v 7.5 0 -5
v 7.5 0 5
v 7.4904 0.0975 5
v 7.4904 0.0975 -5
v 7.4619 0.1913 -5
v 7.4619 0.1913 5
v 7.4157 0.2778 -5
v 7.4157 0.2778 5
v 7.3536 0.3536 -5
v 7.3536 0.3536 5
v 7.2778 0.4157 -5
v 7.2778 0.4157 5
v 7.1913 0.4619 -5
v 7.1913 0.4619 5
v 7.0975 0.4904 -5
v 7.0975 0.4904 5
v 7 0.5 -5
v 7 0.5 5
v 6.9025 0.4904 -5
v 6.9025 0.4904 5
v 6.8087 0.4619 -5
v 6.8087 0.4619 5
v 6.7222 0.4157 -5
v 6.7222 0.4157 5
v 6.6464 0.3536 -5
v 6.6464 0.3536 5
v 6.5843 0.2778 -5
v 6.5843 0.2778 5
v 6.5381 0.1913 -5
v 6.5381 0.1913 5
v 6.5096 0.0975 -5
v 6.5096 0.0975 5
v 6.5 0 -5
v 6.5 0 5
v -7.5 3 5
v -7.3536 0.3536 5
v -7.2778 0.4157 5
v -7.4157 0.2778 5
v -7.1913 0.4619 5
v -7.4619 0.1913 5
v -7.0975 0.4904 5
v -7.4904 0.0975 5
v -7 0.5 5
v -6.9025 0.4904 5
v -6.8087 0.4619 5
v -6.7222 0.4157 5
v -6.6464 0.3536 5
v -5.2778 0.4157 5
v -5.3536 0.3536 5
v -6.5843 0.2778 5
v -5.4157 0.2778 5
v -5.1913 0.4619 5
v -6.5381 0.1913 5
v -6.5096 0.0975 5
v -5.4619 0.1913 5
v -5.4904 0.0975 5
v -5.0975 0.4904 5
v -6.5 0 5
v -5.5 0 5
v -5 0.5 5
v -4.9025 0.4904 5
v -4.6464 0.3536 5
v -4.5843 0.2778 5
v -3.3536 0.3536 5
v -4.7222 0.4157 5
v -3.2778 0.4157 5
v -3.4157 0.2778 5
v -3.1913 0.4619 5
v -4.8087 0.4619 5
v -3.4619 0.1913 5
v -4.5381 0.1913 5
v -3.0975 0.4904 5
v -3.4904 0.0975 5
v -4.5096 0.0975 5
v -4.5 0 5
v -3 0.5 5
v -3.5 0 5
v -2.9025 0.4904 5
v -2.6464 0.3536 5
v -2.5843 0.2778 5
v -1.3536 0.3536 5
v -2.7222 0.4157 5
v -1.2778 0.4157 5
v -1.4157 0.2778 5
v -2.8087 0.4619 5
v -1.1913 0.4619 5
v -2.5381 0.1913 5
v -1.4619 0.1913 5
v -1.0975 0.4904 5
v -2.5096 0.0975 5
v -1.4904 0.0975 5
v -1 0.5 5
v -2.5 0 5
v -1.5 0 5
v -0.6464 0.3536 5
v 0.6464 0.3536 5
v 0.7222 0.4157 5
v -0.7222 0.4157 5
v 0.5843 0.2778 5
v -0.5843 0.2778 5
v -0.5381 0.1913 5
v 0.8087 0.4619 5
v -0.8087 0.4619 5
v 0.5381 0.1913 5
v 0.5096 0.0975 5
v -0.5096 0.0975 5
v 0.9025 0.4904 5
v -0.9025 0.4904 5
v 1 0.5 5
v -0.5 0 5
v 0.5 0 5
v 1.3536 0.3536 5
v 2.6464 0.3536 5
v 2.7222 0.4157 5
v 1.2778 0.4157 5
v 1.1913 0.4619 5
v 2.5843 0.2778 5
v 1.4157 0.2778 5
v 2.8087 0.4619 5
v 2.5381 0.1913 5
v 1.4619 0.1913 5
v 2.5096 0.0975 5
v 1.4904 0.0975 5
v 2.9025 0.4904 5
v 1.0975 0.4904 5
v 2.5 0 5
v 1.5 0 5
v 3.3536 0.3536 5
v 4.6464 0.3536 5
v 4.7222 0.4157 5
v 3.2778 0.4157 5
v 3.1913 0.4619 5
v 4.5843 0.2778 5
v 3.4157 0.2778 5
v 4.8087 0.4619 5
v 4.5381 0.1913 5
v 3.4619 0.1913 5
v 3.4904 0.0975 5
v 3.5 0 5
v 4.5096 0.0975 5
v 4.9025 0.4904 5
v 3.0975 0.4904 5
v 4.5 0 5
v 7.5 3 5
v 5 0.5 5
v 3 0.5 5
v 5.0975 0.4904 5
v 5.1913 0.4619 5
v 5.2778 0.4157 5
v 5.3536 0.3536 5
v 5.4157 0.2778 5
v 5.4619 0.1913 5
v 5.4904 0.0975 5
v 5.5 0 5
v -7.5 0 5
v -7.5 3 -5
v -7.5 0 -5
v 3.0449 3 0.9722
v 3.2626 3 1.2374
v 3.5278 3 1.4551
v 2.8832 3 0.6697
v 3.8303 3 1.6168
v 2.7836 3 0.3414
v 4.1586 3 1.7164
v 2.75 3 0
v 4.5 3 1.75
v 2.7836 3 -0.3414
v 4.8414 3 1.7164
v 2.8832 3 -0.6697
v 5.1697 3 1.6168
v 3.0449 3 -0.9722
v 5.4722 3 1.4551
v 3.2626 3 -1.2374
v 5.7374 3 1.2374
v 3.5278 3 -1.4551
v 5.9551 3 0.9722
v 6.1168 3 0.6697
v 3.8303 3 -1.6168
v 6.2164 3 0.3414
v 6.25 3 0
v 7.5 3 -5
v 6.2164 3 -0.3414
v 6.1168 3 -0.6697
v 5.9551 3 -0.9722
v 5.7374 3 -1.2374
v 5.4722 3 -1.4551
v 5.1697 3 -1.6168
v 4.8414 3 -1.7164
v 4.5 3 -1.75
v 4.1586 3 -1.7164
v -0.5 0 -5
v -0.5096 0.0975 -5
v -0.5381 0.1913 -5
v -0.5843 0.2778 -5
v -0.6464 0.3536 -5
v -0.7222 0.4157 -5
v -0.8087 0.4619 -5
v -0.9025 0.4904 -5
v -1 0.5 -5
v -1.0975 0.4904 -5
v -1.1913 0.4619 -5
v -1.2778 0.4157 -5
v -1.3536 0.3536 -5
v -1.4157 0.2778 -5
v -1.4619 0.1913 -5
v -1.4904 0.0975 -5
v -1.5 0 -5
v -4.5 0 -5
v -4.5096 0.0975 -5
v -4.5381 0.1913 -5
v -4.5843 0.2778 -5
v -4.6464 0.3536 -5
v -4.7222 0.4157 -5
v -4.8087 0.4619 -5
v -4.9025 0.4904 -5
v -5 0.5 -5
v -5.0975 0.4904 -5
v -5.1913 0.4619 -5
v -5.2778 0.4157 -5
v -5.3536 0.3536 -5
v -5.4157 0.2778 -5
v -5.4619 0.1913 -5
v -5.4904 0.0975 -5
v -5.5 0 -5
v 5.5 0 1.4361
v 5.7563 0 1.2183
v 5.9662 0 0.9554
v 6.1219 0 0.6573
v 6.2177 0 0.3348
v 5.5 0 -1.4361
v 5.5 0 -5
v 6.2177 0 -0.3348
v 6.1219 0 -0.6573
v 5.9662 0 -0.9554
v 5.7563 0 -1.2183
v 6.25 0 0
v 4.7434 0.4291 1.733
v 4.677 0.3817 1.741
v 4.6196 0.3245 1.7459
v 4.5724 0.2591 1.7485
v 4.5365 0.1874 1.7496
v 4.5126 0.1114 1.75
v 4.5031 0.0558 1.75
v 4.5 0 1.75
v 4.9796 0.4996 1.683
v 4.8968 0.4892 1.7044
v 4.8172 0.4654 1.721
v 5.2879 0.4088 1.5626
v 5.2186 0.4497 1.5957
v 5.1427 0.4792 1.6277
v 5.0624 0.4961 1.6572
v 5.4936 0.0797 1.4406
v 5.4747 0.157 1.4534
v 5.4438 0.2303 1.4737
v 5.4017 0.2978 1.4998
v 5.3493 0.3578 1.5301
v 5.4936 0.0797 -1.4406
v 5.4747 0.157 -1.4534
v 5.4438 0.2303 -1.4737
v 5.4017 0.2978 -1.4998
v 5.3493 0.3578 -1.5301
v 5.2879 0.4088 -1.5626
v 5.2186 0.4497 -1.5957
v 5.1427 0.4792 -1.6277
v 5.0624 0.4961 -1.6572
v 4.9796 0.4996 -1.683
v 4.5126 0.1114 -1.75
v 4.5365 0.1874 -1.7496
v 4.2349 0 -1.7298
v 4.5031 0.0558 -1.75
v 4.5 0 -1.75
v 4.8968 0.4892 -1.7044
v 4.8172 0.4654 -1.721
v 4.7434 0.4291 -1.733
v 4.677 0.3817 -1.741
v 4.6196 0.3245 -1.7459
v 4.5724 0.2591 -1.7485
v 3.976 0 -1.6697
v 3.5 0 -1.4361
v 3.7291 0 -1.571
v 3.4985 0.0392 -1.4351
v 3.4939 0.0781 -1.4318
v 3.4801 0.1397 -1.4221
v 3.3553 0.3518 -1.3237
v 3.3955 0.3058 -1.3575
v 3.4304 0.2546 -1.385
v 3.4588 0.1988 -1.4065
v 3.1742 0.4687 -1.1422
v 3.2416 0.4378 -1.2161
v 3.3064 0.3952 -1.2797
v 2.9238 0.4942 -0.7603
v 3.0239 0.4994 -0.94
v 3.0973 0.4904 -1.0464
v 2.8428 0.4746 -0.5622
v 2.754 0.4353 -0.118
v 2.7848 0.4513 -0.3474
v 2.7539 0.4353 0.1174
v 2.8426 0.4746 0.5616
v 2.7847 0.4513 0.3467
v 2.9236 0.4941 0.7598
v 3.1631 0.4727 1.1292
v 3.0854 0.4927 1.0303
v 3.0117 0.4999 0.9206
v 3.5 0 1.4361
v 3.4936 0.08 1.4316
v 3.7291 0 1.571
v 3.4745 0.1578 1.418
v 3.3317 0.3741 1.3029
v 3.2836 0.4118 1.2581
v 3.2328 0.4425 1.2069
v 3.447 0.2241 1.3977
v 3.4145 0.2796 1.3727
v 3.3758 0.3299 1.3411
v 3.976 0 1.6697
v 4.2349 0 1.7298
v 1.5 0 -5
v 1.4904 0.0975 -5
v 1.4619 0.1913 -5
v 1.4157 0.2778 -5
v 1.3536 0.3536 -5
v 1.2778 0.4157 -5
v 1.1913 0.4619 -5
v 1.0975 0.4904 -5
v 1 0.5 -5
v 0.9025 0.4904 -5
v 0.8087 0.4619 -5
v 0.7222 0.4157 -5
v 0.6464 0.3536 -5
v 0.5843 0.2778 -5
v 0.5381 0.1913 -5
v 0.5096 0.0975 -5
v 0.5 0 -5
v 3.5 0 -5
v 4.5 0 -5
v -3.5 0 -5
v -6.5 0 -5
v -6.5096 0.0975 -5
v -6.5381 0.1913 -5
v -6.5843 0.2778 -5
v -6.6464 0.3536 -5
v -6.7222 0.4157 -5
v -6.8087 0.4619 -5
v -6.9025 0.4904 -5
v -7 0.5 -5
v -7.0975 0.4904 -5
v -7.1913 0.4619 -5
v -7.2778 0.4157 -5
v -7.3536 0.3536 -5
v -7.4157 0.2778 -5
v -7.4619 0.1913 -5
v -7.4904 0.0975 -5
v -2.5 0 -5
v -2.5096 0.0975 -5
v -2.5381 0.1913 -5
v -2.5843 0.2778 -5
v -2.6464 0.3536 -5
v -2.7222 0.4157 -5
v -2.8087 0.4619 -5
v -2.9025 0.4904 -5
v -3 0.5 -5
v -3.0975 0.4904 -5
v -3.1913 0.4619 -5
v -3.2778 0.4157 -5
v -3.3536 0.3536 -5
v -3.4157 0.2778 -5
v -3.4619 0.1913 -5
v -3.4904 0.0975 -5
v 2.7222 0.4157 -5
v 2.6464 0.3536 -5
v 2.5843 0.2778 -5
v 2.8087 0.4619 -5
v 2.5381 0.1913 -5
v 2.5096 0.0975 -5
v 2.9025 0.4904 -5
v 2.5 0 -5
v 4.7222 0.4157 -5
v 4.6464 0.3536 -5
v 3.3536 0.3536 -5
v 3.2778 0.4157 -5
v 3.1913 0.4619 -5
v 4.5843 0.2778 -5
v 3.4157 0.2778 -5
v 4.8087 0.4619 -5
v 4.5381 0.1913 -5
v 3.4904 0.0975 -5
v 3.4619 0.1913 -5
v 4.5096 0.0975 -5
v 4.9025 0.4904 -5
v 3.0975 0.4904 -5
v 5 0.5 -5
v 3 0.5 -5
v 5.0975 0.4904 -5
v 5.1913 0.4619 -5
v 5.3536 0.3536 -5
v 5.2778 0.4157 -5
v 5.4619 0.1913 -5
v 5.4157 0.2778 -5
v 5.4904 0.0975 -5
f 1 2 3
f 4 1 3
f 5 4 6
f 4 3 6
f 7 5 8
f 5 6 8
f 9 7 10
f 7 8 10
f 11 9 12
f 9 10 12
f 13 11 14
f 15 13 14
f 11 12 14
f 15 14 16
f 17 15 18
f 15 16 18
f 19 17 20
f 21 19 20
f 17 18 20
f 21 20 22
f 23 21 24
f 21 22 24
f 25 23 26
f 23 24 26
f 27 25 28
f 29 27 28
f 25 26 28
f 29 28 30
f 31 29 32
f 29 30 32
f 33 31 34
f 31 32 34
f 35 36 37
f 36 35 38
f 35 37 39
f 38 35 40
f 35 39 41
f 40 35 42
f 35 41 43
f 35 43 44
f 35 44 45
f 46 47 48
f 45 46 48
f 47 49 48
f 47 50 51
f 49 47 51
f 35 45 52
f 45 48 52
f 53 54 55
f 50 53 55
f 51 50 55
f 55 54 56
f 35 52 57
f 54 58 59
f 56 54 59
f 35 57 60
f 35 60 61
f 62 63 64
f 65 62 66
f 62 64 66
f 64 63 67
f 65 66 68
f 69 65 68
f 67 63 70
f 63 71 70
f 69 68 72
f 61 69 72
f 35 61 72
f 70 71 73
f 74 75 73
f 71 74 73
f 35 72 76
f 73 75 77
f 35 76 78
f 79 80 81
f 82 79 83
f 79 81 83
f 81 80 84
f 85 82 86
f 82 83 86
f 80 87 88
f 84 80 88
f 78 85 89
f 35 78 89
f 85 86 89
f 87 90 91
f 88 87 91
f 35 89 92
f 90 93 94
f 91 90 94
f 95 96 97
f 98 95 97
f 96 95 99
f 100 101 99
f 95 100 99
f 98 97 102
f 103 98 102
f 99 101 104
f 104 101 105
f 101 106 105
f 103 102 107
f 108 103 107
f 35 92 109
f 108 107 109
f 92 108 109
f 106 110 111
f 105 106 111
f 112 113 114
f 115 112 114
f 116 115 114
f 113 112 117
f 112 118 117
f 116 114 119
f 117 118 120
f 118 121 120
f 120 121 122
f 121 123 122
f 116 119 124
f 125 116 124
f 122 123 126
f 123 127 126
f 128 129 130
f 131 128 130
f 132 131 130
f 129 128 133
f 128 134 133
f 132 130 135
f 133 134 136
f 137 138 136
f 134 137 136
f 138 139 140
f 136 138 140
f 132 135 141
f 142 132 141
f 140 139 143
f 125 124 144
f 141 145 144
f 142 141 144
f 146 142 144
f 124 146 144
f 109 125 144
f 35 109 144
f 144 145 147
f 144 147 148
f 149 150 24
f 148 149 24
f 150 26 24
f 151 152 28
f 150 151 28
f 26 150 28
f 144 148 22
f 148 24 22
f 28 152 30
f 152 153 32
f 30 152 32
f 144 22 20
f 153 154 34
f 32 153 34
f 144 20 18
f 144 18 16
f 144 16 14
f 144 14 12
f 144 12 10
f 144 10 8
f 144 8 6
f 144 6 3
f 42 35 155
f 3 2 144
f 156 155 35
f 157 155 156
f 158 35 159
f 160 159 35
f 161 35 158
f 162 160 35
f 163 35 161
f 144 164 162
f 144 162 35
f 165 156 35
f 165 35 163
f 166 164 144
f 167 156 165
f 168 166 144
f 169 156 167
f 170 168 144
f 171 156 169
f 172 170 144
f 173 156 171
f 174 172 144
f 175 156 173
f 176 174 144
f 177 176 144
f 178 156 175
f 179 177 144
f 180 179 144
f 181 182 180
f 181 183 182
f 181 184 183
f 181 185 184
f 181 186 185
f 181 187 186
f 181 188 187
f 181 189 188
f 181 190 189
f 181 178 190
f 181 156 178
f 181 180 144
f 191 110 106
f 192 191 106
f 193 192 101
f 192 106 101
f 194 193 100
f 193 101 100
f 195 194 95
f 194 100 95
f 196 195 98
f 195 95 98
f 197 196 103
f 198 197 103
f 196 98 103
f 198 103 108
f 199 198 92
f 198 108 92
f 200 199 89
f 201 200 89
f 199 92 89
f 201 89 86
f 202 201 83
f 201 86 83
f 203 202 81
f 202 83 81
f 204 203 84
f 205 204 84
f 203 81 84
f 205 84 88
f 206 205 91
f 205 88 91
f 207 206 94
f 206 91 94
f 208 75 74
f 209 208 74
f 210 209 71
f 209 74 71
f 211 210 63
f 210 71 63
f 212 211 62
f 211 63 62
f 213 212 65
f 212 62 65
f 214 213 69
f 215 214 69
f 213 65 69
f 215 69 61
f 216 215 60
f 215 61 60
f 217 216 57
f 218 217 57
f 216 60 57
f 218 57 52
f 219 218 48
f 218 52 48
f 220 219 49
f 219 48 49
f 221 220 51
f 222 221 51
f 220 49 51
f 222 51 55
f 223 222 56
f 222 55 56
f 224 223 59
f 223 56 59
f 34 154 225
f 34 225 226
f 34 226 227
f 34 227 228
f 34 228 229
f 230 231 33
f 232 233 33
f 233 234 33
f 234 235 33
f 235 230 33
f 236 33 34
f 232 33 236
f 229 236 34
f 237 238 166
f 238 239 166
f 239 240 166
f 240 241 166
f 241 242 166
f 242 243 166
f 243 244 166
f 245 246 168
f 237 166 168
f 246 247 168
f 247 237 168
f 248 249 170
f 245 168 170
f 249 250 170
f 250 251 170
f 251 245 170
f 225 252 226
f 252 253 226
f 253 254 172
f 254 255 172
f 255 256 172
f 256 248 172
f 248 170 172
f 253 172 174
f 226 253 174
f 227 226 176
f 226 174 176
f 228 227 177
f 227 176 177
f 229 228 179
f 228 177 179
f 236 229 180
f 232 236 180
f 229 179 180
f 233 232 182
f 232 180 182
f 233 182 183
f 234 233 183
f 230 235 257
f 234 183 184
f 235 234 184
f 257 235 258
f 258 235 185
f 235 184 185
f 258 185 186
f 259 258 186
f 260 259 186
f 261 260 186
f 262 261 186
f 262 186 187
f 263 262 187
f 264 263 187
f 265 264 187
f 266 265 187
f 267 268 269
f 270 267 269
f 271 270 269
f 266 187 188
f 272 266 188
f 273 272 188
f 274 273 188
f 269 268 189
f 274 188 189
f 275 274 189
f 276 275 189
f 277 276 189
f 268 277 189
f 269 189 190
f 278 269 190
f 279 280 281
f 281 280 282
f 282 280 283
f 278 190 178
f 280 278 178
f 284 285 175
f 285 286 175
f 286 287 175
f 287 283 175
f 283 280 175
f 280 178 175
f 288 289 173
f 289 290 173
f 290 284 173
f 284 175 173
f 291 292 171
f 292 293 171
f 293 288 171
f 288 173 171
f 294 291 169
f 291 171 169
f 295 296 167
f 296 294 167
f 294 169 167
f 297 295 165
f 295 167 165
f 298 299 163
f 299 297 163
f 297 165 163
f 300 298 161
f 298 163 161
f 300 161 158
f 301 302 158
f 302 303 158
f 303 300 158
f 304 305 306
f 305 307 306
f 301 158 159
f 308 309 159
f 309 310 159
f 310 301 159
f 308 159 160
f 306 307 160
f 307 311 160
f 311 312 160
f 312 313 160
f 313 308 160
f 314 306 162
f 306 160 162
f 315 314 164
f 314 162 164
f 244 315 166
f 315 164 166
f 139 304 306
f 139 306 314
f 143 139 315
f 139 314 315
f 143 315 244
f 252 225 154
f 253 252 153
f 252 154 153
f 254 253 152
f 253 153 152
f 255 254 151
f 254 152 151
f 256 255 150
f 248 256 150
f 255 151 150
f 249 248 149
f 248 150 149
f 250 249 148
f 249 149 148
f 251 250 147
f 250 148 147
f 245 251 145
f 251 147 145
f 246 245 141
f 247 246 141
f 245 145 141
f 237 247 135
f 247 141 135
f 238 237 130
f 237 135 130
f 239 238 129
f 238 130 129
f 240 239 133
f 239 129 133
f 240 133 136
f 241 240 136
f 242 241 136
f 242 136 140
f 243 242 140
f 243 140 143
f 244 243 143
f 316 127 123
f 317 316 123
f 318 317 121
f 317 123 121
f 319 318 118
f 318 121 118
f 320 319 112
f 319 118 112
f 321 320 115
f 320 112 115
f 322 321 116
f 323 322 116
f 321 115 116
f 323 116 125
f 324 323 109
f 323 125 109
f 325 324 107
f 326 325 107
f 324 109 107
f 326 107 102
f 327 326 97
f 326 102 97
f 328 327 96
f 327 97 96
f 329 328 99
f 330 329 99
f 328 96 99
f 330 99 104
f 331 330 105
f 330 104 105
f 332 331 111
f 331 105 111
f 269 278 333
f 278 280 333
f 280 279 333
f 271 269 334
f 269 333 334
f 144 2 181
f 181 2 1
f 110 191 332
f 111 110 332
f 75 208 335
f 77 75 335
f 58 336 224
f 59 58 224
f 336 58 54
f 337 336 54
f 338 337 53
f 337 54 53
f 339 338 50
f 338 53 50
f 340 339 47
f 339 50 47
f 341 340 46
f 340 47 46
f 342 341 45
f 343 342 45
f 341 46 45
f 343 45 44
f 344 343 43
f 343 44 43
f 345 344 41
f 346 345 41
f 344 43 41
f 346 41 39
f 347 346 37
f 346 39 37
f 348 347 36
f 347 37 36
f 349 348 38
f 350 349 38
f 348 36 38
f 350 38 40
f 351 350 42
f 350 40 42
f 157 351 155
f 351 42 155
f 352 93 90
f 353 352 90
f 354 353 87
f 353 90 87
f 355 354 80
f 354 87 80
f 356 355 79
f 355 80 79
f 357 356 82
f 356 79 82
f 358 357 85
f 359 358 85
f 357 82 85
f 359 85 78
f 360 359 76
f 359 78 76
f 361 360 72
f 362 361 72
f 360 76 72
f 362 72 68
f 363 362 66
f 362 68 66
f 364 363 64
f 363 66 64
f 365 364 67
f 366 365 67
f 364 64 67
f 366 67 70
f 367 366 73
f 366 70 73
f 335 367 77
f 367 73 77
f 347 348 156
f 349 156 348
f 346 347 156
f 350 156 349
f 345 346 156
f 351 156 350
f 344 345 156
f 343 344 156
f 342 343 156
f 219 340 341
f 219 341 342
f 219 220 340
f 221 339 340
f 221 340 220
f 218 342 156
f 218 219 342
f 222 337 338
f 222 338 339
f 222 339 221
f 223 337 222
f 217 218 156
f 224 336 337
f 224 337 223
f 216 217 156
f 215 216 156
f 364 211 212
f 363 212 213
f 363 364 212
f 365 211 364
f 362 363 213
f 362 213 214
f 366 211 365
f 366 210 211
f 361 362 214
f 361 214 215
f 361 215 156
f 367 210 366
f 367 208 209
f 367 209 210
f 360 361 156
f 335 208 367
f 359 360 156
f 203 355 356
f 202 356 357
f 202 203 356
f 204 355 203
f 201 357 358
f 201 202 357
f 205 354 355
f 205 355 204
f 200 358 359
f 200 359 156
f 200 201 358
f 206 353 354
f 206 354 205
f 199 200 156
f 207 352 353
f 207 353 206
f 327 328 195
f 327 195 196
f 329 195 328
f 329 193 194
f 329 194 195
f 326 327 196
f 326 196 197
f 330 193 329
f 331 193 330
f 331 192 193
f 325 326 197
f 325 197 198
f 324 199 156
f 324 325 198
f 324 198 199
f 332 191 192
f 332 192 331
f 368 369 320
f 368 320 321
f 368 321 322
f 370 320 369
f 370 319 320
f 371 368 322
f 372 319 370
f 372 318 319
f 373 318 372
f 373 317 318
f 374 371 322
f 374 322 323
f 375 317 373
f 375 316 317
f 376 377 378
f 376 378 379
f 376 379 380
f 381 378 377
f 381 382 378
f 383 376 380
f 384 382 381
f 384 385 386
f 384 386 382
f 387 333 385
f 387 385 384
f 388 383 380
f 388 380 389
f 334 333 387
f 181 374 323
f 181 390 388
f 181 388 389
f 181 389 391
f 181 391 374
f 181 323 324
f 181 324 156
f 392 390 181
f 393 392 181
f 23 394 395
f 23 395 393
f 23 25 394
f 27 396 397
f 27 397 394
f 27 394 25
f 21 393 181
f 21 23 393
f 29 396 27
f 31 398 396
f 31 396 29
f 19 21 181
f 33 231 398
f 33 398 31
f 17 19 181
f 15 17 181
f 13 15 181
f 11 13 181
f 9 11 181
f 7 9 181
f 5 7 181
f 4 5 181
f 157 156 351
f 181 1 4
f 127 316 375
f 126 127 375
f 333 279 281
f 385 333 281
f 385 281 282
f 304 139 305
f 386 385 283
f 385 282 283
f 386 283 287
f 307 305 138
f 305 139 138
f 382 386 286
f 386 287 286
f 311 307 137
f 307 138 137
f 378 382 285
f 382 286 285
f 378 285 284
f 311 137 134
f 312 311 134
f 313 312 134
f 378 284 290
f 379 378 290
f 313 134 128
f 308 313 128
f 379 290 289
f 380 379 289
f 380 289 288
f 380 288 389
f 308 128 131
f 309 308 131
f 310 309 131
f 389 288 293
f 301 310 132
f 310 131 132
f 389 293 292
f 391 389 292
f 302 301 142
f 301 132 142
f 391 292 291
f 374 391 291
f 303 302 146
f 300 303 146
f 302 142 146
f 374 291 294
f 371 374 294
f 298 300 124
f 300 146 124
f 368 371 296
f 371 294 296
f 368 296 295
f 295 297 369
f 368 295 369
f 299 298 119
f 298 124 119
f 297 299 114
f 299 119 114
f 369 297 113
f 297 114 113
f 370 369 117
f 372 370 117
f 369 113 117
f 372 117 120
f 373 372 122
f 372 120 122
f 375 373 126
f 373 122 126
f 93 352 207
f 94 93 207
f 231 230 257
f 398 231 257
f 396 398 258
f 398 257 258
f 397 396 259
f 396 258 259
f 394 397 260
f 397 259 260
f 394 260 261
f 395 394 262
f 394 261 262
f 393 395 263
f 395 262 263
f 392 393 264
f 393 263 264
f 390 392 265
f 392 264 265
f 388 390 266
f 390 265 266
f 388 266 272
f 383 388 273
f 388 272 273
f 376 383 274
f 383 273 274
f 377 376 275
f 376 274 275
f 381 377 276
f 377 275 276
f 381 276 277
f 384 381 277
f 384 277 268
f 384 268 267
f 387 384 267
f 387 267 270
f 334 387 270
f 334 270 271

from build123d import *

# Parameters (mm, degrees)
SKETCH1_W           = 15
SKETCH1_H           = 10
BOSS_EXTRUDE1_DEPTH = 3
SKETCH2_R           = 1.75
CUT_EXTRUDE1_DEPTH  = 10.5
CUT_EXTRUDE2_DEPTH  = 13.854960132
LPATTERN1_COUNT     = 7
LPATTERN1_PITCH     = 2


with BuildPart() as part:
    # Sketch1 → Boss-Extrude1 (new body)
    with BuildSketch(Plane(origin=(0, 0, 0), x_dir=(1, 0, 0), z_dir=(0, 1, 0))):
        Rectangle(SKETCH1_W, SKETCH1_H)
    extrude(amount=BOSS_EXTRUDE1_DEPTH)

    # Sketch2 → Cut-Extrude1 (cut, through all)
    with BuildSketch(Plane(origin=(0, 3, 0), x_dir=(1, 0, 0), z_dir=(0, 1, 0))):
        with Locations(Location((4.5, 0, 0), (0, 0, 270))):
            Circle(SKETCH2_R)
    extrude(amount=-CUT_EXTRUDE1_DEPTH, mode=Mode.SUBTRACT)

    # Sketch3 → Cut-Extrude2 (cut, through all)
    with BuildSketch(Plane.XY.offset(5)):
        with BuildLine():
            Line((-7.5, 0), (-6.5, 0))
            ThreePointArc((-6.5, 0), (-7, 0.5), (-7.5, 0))
        make_face()
        with BuildLine():
            Line((-5.5, 0), (-4.5, 0))
            ThreePointArc((-4.5, 0), (-5, 0.5), (-5.5, 0))
        make_face()
    cut_extrude2 = extrude(amount=-CUT_EXTRUDE2_DEPTH, mode=Mode.SUBTRACT)

    # LPattern1: Cut-Extrude2 ×7
    with Locations(*[(i * LPATTERN1_PITCH, 0, 0) for i in range(1, LPATTERN1_COUNT)]):
        add(cut_extrude2, mode=Mode.SUBTRACT)


solid = part.part
